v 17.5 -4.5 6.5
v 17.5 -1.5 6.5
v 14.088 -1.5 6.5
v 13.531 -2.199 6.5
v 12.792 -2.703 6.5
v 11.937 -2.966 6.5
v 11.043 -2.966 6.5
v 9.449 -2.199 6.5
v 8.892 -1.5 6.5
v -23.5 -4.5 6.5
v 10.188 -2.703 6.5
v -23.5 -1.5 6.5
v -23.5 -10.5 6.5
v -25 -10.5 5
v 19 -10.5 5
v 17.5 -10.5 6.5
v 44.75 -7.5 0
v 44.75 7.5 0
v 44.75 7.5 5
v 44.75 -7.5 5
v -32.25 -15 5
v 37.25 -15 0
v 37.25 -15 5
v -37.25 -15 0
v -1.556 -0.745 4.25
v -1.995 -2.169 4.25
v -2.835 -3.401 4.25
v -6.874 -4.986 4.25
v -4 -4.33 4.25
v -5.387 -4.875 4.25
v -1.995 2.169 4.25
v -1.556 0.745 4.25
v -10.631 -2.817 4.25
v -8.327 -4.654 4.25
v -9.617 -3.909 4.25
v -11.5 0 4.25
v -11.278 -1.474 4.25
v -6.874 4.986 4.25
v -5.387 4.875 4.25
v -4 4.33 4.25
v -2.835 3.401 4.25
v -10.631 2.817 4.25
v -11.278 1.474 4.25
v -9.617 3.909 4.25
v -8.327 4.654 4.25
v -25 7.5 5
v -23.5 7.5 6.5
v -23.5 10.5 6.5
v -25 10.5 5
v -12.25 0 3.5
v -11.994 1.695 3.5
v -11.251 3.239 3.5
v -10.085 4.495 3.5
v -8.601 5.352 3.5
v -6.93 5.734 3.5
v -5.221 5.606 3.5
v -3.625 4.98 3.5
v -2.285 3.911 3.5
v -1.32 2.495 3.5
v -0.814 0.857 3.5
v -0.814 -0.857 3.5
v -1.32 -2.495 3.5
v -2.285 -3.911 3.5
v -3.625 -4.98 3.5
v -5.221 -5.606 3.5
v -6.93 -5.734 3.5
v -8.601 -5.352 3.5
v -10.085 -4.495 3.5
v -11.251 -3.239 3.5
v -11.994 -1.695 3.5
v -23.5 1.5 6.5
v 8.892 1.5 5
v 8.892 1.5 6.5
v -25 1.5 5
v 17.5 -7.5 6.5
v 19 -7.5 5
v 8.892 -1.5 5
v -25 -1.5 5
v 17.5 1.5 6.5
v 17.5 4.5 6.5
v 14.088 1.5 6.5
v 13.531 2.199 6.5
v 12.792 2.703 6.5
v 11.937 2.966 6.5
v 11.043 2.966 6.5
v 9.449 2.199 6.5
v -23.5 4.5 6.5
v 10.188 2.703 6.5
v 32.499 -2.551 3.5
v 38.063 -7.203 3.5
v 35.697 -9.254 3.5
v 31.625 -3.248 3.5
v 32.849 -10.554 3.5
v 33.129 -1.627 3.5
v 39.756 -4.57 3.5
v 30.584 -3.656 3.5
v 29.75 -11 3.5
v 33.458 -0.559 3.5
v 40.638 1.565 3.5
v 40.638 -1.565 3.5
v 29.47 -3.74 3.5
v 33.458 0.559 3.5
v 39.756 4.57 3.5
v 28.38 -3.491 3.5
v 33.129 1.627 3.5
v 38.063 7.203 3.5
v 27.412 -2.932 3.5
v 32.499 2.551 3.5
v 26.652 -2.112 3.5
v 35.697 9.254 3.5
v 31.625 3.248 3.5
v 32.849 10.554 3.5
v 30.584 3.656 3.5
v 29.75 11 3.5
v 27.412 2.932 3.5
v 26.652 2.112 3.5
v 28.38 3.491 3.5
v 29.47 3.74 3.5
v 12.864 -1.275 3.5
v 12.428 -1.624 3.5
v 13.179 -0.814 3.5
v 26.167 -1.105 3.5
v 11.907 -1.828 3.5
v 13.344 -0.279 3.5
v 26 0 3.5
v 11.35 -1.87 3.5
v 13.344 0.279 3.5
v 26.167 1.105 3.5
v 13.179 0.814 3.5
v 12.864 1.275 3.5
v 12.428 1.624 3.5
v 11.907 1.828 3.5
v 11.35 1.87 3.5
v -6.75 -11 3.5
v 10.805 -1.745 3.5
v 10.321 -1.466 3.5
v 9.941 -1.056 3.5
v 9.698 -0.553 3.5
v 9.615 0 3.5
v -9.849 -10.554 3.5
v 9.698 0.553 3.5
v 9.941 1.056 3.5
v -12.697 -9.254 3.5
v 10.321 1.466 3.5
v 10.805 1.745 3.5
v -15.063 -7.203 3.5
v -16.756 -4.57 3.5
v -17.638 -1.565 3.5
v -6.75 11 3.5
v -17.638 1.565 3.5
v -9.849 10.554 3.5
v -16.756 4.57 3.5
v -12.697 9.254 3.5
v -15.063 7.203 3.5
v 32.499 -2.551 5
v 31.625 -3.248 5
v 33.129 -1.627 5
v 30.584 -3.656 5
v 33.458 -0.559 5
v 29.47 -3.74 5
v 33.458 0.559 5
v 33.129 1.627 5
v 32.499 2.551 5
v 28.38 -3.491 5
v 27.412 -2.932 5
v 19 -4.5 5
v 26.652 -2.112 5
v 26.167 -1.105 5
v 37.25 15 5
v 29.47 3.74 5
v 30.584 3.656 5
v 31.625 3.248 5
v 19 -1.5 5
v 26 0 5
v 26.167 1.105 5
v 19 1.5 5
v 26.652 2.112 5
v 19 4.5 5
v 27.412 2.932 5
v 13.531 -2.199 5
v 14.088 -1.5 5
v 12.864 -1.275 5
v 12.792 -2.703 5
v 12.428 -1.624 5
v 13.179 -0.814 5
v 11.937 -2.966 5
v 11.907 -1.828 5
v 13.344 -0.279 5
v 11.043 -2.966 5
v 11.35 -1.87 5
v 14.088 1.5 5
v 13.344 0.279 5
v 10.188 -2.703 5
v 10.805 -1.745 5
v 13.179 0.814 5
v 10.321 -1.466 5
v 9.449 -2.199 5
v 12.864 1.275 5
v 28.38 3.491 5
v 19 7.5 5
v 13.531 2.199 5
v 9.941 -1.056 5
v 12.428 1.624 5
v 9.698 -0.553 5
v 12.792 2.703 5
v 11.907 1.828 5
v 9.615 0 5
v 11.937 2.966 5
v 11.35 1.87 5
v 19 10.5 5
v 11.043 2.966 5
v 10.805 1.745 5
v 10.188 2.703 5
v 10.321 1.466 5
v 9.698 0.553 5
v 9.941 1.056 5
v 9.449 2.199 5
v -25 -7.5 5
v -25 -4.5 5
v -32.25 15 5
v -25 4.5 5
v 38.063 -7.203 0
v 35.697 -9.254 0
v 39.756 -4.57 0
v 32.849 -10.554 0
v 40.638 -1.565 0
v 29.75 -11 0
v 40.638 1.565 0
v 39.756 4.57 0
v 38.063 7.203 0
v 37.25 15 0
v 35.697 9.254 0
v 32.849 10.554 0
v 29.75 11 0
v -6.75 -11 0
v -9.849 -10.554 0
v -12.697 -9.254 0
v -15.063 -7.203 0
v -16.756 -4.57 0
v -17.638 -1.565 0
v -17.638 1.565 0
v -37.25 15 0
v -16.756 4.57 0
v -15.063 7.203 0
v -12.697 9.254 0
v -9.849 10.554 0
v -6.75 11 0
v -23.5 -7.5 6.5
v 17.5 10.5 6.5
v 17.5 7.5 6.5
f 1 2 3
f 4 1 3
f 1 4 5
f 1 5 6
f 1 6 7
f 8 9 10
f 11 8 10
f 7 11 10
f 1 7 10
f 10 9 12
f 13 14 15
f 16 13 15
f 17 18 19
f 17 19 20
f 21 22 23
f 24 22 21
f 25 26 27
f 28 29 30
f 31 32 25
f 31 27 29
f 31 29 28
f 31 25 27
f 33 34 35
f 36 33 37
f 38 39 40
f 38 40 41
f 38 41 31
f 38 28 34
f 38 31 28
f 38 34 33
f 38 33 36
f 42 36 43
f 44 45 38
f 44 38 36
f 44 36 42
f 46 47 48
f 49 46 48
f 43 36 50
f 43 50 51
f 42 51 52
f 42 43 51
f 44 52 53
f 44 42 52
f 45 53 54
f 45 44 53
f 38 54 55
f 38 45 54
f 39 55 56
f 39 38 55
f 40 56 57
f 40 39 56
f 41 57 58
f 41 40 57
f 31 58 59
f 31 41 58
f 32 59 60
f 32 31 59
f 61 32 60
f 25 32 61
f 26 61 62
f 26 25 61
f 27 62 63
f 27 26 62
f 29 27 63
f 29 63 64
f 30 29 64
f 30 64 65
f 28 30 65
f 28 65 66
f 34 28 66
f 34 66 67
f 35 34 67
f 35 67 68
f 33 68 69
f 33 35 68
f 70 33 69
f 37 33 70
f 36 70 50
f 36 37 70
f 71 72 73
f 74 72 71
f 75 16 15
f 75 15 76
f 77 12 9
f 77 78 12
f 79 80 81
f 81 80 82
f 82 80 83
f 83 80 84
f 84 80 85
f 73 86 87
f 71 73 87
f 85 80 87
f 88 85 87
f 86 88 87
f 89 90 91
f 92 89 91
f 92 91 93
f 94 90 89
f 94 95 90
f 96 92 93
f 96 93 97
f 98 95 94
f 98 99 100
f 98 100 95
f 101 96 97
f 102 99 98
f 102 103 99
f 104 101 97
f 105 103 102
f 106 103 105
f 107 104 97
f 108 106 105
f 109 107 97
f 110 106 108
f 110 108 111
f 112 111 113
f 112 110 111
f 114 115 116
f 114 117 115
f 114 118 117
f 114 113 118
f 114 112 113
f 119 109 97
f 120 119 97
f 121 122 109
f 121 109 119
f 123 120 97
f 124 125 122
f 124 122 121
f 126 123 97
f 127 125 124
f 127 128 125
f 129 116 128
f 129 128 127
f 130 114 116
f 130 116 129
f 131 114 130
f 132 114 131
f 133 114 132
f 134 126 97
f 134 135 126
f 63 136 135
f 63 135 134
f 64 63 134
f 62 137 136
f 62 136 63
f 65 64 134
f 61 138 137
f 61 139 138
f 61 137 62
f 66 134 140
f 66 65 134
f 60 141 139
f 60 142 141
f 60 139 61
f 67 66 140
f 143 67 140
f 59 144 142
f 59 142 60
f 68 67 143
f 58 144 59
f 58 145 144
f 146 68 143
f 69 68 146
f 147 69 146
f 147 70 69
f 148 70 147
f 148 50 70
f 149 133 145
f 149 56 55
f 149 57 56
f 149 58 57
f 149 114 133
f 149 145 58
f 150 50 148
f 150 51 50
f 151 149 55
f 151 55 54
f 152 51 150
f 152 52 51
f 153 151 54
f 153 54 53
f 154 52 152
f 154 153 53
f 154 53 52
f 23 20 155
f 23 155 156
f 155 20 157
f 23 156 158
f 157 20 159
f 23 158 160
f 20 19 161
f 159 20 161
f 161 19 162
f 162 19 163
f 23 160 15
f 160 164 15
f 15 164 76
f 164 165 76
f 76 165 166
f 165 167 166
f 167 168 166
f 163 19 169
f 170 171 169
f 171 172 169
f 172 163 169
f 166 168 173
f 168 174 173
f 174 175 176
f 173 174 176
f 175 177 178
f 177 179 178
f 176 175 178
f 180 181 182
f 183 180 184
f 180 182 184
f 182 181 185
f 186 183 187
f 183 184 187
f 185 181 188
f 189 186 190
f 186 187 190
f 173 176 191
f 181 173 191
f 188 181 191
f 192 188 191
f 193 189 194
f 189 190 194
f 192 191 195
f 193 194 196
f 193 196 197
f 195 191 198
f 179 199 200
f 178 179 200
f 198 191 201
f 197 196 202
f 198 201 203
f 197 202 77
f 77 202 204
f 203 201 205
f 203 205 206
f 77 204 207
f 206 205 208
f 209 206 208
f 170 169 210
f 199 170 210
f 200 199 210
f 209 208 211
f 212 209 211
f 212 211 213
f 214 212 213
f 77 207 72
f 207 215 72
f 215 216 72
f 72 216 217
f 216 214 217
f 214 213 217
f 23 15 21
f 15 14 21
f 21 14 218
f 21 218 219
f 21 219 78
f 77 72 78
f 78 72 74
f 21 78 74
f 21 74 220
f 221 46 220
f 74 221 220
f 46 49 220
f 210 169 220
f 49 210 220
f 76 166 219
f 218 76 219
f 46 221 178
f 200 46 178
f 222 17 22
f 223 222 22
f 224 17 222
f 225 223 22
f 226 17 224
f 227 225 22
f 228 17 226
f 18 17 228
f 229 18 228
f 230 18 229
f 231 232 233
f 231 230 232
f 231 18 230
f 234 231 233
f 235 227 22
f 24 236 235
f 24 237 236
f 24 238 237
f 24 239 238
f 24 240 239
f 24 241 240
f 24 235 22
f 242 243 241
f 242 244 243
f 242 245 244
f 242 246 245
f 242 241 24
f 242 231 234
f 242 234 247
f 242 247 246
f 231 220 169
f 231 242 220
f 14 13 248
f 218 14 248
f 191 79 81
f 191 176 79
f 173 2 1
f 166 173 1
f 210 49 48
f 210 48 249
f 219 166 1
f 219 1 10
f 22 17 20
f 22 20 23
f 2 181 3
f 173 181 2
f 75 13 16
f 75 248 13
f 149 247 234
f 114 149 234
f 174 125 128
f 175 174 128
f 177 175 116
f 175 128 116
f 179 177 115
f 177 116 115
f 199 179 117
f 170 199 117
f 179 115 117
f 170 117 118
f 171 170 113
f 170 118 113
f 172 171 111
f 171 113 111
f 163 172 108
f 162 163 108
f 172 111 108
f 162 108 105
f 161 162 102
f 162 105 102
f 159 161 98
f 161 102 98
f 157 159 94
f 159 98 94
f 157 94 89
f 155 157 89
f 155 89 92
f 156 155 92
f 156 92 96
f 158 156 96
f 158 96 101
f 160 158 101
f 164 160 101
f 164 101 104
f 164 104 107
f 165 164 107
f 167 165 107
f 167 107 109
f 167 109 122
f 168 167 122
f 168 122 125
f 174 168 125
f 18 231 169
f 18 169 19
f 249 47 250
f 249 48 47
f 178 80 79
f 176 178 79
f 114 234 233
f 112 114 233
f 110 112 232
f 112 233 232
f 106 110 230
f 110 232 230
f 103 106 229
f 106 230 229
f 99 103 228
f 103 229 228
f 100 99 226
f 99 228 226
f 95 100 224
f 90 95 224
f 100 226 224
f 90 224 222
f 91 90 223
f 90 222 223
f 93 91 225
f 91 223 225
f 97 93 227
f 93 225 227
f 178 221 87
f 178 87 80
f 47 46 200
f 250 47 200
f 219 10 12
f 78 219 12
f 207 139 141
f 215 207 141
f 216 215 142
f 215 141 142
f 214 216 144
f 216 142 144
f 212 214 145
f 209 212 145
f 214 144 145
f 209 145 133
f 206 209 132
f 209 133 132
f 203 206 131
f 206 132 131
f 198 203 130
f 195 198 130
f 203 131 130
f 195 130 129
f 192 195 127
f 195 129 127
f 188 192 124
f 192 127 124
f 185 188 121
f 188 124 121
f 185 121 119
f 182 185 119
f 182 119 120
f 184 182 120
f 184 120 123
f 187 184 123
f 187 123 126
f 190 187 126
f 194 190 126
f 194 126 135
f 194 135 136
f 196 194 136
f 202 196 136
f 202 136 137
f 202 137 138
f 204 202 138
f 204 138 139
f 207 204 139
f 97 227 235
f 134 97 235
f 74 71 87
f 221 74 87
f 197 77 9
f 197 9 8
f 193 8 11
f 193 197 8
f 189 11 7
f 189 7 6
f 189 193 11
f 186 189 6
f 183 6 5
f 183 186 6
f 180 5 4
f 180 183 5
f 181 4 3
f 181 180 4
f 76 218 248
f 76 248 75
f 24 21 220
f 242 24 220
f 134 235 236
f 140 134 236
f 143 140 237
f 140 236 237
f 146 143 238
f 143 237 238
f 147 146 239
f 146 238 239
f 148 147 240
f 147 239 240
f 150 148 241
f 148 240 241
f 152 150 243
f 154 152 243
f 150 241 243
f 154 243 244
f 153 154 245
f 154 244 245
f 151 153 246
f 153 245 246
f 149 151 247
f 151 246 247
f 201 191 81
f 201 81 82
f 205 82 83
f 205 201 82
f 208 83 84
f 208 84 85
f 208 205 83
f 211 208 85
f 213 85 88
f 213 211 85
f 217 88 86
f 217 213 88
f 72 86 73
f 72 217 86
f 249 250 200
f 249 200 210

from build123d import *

# Parameters (mm, degrees)
BOSS_EXTRUDE1_DEPTH = 5
CHAMFER1_SIZE       = 5
CUT_EXTRUDE1_DEPTH  = 3.5
SKETCH3_R           = 5
CUT_EXTRUDE2_DEPTH  = 0.75
CHAMFER2_SIZE       = 0.75
SKETCH4_R           = 1.875
SKETCH4_R_2         = 3.75
CUT_EXTRUDE3_DEPTH  = 48.326657393
SKETCH5_W           = 44
SKETCH5_H           = 3
BOSS_EXTRUDE2_DEPTH = 1.5
CHAMFER3_SIZE       = 1.5


with BuildPart() as part:
    # Sketch1 → Boss-Extrude1 (new body)
    with BuildSketch(Plane.XY):
        Polygon((37.25, 15), (44.75, 7.5), (44.75, -7.5), (37.25, -15), (-37.25, -15), (-37.25, 15), align=None)
    extrude(amount=BOSS_EXTRUDE1_DEPTH)

    # Chamfer1
    chamfer1_edges = [part.edges().sort_by_distance(p)[0] for p in [
        (-37.25, 0, 5),
    ]]
    chamfer(chamfer1_edges, length=CHAMFER1_SIZE - 0.0001)  # a hair under: the kernel refuses the full size

    # Sketch2 → Cut-Extrude1 (cut)
    with BuildSketch(Plane(origin=(0, 0, 0), x_dir=(-1, 0, 0), z_dir=(0, 0, -1))):
        with BuildLine():
            Line((-29.75, -11), (6.75, -11))
            ThreePointArc((6.75, -11), (17.75, 0), (6.75, 11))
            Line((6.75, 11), (-29.75, 11))
            ThreePointArc((-29.75, 11), (-40.75, 0), (-29.75, -11))
        make_face()
    extrude(amount=-CUT_EXTRUDE1_DEPTH, mode=Mode.SUBTRACT)

    # Sketch3 → Cut-Extrude2 (cut)
    with BuildSketch(Plane(origin=(0, 0, 3.5), x_dir=(-1, 0, 0), z_dir=(0, 0, -1))):
        with Locations((6.5, 0)):
            Circle(SKETCH3_R)
    extrude(amount=-CUT_EXTRUDE2_DEPTH, mode=Mode.SUBTRACT)

    # Chamfer2
    chamfer2_edges = [part.edges().sort_by_distance(p)[0] for p in [
        (-1.5, 0, 3.5),
    ]]
    chamfer(chamfer2_edges, length=CHAMFER2_SIZE - 0.0001)  # a hair under: the kernel refuses the full size

    # Sketch4 → Cut-Extrude3 (cut, through all)
    with BuildSketch(Plane(origin=(0, 0, 3.5), x_dir=(-1, 0, 0), z_dir=(0, 0, -1))):
        with Locations((-11.49, 0)):
            Circle(SKETCH4_R)
        with Locations((-29.75, 0)):
            Circle(SKETCH4_R_2)
    extrude(amount=-CUT_EXTRUDE3_DEPTH, mode=Mode.SUBTRACT)

    # Sketch5 → Boss-Extrude2 (add)
    with BuildSketch(Plane.XY.offset(5)):
        with Locations((-3, 9)):
            Rectangle(SKETCH5_W, SKETCH5_H)
        with BuildLine():
            Line((-25, 4.5), (19, 4.5))
            Line((19, 4.5), (19, 1.5))
            Line((19, 1.5), (14.088076211, 1.5))
            ThreePointArc((14.088076211, 1.5), (11.49, 3), (8.891923789, 1.5))
            Line((8.891923789, 1.5), (-25, 1.5))
            Line((-25, 1.5), (-25, 4.5))
        make_face()
        with Locations((-3, -9)):
            Rectangle(SKETCH5_W, SKETCH5_H)
        with BuildLine():
            Line((-25, -1.5), (8.891923789, -1.5))
            ThreePointArc((8.891923789, -1.5), (11.49, -3), (14.088076211, -1.5))
            Line((14.088076211, -1.5), (19, -1.5))
            Line((19, -1.5), (19, -4.5))
            Line((19, -4.5), (-25, -4.5))
            Line((-25, -4.5), (-25, -1.5))
        make_face()
    extrude(amount=BOSS_EXTRUDE2_DEPTH)

    # Chamfer3
    chamfer3_edges = [part.edges().sort_by_distance(p)[0] for p in [
        (-25, 9, 6.5),
        (-25, 3, 6.5),
        (-25, -3, 6.5),
        (-25, -9, 6.5),
        (19, -9, 6.5),
        (19, -3, 6.5),
        (19, 3, 6.5),
        (19, 9, 6.5),
    ]]
    chamfer(chamfer3_edges, length=CHAMFER3_SIZE - 0.0001)  # a hair under: the kernel refuses the full size


solid = part.part
